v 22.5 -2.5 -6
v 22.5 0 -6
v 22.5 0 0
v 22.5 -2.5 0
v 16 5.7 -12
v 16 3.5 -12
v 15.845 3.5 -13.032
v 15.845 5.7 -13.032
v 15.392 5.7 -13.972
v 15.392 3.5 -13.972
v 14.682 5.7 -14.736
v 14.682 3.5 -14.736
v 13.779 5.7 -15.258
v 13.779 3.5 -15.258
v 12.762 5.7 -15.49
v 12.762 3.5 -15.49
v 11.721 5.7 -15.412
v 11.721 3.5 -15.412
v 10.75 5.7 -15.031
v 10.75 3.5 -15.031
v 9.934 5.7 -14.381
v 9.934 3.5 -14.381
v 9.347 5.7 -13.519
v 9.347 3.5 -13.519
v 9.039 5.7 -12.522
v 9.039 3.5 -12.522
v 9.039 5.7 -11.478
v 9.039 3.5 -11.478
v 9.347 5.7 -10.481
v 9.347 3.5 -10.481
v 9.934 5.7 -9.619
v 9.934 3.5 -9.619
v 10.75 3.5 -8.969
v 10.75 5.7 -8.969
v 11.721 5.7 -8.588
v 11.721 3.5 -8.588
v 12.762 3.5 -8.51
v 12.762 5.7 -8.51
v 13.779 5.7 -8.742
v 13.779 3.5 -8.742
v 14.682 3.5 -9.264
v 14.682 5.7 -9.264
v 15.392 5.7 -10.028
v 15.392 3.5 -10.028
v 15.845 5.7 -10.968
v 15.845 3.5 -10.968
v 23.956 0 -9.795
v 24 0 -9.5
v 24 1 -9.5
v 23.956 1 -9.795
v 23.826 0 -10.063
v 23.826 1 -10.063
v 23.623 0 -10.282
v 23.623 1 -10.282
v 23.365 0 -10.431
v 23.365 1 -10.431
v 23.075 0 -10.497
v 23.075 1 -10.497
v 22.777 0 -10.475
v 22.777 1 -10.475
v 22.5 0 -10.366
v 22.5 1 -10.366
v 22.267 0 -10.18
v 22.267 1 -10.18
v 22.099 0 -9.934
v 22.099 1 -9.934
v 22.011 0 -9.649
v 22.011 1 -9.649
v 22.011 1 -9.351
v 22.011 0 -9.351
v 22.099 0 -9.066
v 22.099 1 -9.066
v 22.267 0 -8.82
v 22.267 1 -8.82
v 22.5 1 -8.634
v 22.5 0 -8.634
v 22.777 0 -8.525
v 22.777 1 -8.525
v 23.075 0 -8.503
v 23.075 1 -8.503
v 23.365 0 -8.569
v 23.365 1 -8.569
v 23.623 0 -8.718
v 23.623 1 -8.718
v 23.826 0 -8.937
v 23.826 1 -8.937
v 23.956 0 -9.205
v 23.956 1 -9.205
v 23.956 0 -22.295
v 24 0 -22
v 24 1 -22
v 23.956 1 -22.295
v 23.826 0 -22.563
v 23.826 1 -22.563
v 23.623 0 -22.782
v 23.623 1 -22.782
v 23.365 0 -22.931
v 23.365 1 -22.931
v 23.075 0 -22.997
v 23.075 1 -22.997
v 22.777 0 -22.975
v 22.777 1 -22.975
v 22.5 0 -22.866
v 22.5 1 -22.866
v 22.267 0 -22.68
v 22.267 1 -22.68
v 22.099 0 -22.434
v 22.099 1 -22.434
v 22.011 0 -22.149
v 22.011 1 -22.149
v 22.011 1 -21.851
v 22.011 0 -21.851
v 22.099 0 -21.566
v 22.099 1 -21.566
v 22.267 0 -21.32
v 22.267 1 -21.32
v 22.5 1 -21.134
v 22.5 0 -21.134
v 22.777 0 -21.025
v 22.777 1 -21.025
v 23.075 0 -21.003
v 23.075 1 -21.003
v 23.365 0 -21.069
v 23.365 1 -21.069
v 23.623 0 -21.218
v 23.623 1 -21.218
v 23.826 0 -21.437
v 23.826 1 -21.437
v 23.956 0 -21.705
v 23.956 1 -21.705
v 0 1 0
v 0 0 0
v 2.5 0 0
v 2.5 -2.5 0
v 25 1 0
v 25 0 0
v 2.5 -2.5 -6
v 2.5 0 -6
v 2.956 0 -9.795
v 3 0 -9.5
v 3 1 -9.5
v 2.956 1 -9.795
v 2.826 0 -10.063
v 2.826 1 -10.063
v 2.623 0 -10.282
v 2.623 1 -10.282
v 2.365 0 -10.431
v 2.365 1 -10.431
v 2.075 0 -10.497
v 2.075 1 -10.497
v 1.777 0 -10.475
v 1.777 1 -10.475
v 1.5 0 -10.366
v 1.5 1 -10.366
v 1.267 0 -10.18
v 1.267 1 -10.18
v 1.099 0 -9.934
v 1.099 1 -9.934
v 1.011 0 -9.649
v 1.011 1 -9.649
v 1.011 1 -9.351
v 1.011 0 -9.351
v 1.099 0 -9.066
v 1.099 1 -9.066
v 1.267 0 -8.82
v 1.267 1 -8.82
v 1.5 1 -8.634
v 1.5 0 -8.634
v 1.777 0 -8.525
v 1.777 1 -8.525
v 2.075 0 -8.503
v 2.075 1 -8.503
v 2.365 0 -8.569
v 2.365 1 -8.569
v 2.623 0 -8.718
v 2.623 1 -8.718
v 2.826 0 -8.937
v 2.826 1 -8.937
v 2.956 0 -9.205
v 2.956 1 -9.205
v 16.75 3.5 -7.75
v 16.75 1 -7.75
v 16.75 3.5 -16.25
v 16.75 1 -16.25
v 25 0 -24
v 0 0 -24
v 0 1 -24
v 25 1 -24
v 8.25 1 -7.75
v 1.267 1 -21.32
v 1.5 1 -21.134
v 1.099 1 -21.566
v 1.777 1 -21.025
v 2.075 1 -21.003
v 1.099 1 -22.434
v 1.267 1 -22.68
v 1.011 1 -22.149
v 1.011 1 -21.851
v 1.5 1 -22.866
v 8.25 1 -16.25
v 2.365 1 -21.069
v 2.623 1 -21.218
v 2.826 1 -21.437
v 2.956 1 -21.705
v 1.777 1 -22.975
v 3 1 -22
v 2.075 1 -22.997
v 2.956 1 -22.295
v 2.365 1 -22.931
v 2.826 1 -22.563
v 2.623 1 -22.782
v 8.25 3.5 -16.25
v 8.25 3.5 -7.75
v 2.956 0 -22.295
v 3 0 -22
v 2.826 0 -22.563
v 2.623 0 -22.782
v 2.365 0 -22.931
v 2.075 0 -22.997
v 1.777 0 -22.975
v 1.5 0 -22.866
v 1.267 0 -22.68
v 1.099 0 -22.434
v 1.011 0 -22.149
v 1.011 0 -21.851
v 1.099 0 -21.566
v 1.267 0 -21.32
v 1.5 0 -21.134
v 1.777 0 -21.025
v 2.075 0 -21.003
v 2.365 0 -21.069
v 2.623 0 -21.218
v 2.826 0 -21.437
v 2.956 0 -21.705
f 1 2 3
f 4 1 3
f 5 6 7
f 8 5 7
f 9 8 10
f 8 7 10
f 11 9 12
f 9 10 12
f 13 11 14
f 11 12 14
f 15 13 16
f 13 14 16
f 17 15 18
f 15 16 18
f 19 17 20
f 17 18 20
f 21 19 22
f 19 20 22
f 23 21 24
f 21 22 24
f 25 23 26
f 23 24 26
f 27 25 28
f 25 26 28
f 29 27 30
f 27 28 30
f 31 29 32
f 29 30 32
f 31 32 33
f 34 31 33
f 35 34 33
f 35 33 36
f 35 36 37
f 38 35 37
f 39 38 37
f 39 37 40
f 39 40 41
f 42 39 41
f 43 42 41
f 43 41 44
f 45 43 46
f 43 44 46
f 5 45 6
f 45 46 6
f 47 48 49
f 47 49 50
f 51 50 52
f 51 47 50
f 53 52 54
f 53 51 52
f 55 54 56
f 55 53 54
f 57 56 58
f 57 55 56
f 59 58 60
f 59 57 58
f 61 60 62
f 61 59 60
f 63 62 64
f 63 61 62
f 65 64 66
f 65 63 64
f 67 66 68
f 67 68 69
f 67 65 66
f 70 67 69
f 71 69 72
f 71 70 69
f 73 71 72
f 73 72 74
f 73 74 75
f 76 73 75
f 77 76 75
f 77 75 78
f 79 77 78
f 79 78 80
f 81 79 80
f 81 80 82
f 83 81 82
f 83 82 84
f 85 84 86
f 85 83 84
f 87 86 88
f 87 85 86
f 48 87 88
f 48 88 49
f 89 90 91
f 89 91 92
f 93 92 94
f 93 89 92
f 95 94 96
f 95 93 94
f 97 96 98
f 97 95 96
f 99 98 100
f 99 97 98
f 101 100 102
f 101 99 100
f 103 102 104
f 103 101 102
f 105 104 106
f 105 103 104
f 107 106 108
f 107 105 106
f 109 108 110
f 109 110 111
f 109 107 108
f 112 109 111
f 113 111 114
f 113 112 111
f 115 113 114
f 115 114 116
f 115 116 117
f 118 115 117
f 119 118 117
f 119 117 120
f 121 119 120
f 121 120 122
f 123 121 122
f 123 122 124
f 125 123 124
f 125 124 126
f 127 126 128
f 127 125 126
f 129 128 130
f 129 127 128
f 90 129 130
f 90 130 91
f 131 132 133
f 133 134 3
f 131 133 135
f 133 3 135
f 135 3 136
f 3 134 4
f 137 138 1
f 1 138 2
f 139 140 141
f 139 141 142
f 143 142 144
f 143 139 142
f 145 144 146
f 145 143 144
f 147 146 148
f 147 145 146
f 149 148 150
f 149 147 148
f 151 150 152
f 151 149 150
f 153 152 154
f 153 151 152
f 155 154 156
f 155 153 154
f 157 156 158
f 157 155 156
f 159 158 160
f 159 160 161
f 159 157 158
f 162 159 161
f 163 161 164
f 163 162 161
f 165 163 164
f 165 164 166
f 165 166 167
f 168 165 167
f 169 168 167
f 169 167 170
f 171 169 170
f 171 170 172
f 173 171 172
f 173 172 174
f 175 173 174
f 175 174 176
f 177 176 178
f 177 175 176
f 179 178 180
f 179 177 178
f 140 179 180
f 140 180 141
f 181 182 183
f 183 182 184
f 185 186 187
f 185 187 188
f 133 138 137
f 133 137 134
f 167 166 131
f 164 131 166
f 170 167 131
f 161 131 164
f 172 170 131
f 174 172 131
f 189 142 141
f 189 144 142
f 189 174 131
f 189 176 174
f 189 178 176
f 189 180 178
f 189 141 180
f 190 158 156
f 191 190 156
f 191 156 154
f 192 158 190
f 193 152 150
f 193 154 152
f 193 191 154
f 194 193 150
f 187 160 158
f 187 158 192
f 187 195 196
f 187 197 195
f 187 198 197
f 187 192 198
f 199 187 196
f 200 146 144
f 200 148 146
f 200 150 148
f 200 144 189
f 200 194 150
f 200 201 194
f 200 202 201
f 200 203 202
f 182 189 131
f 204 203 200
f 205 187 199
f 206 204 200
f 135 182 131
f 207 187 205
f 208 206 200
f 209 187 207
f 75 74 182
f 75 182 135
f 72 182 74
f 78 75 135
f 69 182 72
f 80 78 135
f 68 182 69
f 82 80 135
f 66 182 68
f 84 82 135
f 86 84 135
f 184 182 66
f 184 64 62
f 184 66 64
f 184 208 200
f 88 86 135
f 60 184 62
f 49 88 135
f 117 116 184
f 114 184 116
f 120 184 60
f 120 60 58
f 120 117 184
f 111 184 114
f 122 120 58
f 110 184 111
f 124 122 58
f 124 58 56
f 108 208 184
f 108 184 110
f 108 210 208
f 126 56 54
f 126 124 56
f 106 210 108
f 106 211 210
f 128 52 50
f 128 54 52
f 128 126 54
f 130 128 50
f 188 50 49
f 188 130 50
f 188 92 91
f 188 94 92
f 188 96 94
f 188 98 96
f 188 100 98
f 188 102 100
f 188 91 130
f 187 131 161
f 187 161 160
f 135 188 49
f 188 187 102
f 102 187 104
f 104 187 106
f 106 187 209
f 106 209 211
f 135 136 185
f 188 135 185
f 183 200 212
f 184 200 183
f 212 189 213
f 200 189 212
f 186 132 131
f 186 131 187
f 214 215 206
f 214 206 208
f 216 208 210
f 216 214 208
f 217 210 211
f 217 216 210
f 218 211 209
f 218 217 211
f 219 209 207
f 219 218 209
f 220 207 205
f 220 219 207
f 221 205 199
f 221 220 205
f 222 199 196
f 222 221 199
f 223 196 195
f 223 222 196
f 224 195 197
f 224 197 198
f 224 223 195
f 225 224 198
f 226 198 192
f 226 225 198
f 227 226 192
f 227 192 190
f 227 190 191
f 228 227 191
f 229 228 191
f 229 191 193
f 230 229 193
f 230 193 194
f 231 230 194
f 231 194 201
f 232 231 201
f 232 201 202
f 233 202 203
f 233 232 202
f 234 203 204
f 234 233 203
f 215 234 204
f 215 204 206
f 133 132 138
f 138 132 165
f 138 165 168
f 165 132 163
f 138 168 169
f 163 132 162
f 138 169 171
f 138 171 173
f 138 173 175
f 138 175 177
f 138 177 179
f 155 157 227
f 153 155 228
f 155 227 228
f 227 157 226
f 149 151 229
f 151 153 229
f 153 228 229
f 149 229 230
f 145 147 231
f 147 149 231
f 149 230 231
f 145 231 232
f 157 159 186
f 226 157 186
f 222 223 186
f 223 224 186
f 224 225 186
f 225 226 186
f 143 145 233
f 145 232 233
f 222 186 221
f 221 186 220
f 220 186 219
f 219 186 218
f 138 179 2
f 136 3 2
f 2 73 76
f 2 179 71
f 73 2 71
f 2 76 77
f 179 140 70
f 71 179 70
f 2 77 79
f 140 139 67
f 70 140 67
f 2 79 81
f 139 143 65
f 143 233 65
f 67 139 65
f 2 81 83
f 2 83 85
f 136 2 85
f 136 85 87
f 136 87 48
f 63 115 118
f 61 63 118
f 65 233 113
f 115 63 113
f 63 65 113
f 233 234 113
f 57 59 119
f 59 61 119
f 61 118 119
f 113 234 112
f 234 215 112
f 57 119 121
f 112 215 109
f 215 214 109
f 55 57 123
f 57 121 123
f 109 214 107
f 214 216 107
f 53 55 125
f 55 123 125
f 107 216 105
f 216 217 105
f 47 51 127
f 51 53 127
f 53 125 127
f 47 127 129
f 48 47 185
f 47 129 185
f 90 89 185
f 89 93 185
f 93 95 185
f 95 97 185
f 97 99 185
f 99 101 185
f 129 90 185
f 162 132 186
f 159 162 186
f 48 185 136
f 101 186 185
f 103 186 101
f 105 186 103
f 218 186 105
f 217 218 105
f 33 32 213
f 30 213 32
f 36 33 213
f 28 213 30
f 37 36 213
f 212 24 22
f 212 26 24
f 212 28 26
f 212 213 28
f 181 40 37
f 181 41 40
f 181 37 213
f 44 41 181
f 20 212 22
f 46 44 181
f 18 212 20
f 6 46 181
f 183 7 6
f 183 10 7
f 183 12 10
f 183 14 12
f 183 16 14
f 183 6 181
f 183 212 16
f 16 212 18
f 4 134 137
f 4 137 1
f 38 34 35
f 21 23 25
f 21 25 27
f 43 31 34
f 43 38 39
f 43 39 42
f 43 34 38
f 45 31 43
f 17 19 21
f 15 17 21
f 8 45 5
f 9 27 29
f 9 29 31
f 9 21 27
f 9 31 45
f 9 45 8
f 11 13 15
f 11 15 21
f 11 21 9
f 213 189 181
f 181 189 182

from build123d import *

# Parameters (mm, degrees)
SKETCH1_W           = 25
SKETCH1_H           = 24
SKETCH1_R           = 1
BOSS_EXTRUDE1_DEPTH = 1
SKETCH2_W           = 8.5
SKETCH2_H           = 8.5
BOSS_EXTRUDE2_DEPTH = 2.5
SKETCH3_R           = 3.5
BOSS_EXTRUDE3_DEPTH = 2.2
SKETCH4_W           = 20
SKETCH4_H           = 6
BOSS_EXTRUDE4_DEPTH = 2.5


with BuildPart() as part:
    # Sketch1 → Boss-Extrude1 (new body)
    with BuildSketch(Plane(origin=(0, 0, 0), x_dir=(1, 0, 0), z_dir=(0, 1, 0))):
        with Locations((12.5, 12)):
            Rectangle(SKETCH1_W, SKETCH1_H)
        with Locations((2, 22)):
            Circle(SKETCH1_R, mode=Mode.SUBTRACT)
        with Locations((2, 9.5)):
            Circle(SKETCH1_R, mode=Mode.SUBTRACT)
        with Locations((23, 9.5)):
            Circle(SKETCH1_R, mode=Mode.SUBTRACT)
        with Locations((23, 22)):
            Circle(SKETCH1_R, mode=Mode.SUBTRACT)
    extrude(amount=BOSS_EXTRUDE1_DEPTH)

    # Sketch2 → Boss-Extrude2 (add)
    with BuildSketch(Plane(origin=(0, 1, 0), x_dir=(1, 0, 0), z_dir=(0, 1, 0))):
        with Locations((12.5, 12)):
            Rectangle(SKETCH2_W, SKETCH2_H)
    extrude(amount=BOSS_EXTRUDE2_DEPTH)

    # Sketch3 → Boss-Extrude3 (add)
    with BuildSketch(Plane(origin=(0, 3.5, 0), x_dir=(1, 0, 0), z_dir=(0, 1, 0))):
        with Locations((12.5, 12)):
            Circle(SKETCH3_R)
    extrude(amount=BOSS_EXTRUDE3_DEPTH)

    # Sketch4 → Boss-Extrude4 (add)
    with BuildSketch(Plane.XZ):
        with Locations((12.5, -3)):
            Rectangle(SKETCH4_W, SKETCH4_H)
    extrude(amount=BOSS_EXTRUDE4_DEPTH)


solid = part.part
